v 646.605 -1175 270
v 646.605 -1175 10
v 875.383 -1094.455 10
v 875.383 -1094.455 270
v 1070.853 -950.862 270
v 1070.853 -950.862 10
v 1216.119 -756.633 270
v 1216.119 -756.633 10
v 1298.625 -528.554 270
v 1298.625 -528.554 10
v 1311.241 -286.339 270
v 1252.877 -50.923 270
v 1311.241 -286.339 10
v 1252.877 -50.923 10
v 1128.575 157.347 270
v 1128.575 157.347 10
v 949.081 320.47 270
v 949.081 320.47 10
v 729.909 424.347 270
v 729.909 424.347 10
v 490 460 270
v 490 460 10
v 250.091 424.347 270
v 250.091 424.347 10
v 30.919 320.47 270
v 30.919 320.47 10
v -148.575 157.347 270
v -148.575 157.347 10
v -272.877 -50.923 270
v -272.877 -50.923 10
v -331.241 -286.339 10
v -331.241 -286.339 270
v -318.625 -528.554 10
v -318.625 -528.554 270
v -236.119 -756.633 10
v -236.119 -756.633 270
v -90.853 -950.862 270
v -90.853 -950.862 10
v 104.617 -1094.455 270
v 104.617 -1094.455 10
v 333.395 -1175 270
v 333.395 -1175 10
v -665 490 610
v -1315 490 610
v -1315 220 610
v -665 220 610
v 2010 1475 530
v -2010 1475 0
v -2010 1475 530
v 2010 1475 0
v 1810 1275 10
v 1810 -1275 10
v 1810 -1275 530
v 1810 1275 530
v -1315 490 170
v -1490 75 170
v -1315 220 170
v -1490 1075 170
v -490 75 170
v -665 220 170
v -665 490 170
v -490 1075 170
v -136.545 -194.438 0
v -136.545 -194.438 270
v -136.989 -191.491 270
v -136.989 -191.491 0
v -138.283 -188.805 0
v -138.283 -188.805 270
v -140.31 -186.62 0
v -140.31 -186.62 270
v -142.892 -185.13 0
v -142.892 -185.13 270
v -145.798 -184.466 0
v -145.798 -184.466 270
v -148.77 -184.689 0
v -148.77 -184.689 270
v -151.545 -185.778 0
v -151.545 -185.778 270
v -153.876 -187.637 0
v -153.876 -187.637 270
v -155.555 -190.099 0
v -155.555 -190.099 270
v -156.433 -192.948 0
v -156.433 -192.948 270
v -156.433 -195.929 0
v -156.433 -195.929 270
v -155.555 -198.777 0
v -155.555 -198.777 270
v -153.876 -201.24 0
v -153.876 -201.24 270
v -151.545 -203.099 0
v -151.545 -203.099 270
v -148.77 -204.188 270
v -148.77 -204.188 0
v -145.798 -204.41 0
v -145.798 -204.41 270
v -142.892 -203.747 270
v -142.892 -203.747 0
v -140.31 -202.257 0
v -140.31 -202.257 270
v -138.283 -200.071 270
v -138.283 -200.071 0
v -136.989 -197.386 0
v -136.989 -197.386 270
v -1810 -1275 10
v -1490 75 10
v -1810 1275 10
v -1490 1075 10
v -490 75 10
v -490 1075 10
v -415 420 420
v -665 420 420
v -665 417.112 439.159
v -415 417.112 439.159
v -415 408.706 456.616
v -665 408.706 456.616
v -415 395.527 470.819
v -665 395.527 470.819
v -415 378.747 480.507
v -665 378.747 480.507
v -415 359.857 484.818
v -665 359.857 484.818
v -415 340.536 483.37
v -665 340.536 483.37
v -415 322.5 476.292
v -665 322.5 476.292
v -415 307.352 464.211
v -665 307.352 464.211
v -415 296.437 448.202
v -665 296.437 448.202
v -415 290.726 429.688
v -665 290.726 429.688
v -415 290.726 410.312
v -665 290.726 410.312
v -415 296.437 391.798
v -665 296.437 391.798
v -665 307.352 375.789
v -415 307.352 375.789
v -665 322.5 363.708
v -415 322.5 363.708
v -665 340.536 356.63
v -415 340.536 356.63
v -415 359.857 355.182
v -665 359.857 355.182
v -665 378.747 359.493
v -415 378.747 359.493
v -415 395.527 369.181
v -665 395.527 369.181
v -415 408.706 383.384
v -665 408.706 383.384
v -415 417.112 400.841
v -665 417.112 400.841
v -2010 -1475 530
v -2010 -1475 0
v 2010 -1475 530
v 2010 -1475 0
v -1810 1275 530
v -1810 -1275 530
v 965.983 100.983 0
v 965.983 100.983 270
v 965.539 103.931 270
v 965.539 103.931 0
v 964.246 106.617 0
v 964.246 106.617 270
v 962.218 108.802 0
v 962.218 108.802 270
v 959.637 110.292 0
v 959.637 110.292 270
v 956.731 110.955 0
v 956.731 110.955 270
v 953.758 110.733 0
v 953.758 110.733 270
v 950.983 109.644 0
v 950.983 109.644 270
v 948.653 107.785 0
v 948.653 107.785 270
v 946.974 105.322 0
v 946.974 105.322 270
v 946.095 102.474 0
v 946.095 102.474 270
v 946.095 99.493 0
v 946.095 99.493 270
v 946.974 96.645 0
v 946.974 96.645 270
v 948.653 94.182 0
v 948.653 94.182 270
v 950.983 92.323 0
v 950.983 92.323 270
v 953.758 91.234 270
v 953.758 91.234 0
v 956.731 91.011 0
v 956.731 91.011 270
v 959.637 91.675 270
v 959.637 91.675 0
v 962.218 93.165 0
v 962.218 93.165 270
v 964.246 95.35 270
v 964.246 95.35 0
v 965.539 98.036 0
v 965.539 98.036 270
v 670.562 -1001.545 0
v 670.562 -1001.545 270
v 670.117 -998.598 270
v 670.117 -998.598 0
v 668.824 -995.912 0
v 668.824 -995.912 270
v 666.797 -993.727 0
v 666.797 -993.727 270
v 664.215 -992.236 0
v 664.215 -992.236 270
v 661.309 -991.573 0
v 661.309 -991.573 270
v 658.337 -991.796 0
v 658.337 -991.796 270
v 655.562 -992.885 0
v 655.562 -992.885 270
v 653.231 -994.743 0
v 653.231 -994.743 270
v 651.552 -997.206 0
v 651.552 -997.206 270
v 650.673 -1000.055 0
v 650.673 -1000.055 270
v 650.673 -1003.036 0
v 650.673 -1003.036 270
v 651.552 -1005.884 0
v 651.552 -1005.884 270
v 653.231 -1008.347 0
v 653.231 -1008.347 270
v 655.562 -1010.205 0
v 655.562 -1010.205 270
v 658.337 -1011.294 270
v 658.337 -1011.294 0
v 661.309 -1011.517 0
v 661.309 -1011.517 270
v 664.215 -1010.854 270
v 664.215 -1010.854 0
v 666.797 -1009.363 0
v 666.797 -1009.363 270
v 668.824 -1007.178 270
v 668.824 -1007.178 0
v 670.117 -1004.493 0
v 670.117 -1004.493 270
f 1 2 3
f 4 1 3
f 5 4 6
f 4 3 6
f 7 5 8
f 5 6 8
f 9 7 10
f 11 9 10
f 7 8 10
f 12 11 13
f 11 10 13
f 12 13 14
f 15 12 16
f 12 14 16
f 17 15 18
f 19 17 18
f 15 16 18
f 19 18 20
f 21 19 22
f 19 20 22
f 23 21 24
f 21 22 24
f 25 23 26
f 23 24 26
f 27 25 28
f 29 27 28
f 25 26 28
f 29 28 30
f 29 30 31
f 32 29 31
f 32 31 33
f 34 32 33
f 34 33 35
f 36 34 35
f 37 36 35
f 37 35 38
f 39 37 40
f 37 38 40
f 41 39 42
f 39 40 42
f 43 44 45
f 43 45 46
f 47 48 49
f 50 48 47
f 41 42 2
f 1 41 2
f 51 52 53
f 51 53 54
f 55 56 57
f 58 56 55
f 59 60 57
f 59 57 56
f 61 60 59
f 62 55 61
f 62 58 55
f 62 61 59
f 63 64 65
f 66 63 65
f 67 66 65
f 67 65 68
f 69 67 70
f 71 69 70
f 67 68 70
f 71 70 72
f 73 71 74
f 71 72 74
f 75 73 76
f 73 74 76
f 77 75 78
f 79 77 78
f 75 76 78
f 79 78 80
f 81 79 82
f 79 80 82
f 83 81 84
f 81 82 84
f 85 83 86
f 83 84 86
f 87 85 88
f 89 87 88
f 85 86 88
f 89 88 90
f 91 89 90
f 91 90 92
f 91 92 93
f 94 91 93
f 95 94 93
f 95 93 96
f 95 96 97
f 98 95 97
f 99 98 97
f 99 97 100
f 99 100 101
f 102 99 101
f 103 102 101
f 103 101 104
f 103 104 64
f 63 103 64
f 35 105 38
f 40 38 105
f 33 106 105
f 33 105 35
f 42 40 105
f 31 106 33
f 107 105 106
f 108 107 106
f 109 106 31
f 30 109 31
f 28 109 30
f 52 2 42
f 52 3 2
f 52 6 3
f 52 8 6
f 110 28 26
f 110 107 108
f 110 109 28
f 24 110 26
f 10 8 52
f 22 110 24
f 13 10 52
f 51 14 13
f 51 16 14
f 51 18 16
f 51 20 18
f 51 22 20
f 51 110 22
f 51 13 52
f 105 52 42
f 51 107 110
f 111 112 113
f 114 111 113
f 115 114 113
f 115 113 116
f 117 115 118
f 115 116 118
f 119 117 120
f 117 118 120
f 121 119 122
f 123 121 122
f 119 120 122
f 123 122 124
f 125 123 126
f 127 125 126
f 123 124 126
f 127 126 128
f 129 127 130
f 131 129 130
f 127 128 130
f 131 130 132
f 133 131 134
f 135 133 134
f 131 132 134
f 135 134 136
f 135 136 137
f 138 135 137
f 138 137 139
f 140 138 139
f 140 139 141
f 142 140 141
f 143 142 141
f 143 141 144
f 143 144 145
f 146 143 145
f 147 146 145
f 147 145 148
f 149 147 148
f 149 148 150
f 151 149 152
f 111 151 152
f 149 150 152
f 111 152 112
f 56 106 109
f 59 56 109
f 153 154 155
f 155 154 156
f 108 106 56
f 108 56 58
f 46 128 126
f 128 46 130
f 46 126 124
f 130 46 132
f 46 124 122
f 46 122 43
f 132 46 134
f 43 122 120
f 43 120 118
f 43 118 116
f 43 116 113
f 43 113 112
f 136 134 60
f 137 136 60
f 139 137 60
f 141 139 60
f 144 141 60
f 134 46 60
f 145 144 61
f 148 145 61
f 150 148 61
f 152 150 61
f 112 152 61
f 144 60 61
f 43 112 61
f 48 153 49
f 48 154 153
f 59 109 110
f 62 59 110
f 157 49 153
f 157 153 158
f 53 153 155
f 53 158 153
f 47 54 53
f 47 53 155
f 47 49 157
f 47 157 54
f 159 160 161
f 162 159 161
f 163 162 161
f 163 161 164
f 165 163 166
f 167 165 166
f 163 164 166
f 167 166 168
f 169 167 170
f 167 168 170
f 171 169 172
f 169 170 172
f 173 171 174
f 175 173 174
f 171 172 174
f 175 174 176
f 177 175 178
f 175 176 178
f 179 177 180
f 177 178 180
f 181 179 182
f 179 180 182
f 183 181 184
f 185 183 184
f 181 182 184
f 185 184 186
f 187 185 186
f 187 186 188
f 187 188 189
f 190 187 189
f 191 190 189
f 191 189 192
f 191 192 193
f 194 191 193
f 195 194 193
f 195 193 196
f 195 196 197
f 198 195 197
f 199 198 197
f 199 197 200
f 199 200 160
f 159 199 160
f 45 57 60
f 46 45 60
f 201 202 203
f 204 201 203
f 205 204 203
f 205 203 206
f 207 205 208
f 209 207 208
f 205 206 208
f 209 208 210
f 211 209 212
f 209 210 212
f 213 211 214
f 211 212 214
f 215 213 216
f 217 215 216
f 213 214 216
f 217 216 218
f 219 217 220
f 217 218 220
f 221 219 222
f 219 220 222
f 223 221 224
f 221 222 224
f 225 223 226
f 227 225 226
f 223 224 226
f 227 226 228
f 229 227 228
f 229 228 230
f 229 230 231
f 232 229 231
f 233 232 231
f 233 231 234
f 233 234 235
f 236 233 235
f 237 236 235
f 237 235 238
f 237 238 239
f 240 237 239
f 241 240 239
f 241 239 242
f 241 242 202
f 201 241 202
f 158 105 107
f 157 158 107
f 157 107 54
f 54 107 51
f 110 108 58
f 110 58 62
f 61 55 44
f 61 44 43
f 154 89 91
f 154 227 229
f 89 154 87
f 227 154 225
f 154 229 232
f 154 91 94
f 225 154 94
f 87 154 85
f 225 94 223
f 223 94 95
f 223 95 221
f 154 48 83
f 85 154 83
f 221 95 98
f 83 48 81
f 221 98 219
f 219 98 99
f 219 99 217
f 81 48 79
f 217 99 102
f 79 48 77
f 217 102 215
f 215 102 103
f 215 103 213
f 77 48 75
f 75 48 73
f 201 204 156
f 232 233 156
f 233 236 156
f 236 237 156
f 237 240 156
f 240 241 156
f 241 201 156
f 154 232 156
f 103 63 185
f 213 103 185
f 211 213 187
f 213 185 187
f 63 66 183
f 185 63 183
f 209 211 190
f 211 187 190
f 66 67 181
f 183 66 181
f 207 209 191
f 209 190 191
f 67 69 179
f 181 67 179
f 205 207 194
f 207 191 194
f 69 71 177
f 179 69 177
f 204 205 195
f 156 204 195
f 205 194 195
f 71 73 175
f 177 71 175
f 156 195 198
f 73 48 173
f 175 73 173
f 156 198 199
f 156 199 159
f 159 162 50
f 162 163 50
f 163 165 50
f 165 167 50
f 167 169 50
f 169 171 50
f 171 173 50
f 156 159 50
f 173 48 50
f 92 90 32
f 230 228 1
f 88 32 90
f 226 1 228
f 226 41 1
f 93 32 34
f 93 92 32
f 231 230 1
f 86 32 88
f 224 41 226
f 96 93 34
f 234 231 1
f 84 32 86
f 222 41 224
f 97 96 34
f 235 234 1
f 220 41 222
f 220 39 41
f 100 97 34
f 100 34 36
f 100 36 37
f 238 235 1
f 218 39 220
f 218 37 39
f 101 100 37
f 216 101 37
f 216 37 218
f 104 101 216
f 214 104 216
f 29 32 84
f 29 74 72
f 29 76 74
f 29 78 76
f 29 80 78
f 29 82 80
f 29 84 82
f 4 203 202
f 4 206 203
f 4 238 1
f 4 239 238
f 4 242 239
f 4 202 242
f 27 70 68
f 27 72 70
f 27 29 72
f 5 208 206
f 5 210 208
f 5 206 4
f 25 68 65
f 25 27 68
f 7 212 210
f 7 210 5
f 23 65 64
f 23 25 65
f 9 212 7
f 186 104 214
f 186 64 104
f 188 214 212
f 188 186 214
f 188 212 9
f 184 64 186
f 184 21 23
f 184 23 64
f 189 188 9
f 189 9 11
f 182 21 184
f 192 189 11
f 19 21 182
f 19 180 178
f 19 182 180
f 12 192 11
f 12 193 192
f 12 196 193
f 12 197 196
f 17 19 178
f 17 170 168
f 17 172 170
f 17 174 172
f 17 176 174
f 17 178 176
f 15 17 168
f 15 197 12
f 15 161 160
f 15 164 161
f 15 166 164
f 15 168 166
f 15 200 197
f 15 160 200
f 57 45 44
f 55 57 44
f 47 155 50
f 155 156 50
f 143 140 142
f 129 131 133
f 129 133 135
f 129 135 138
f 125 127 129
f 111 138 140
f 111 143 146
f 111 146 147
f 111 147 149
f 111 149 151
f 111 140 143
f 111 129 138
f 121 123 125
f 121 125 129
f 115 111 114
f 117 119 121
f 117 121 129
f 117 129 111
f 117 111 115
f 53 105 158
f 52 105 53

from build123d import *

# Parameters (mm, degrees)
F0_W      = 4020
F0_H      = 2950
F1_DEPTH  = 10
F2_W      = 4020
F2_H      = 2950
F2_W_2    = 3620
F2_H_2    = 2550
F3_DEPTH  = 520
F4_W      = 1000
F4_H      = 1000
F5_DEPTH  = 160
F7_DEPTH  = 260
F8_W      = 650
F8_H      = 270
F9_DEPTH  = 440
F10_R     = 65
F11_DEPTH = 250
F12_R     = 10
F13_DEPTH = 280


with BuildPart() as f1:
    # F0 (on Top) → F1 (new body)
    with BuildSketch(Plane.XY):
        Rectangle(F0_W, F0_H)
    extrude(amount=F1_DEPTH)

    # F2 (on face) → F3 (join)
    with BuildSketch(Plane.XY.offset(10)):
        Rectangle(F2_W, F2_H)
        Rectangle(F2_W_2, F2_H_2, mode=Mode.SUBTRACT)
    extrude(amount=F3_DEPTH)

    # F4 (on face) → F5 (join)
    with BuildSketch(Plane.XY.offset(10)):
        with Locations((-990, 575)):
            Rectangle(F4_W, F4_H)
    extrude(amount=F5_DEPTH)

    # F6 (on face) → F7 (join)
    with BuildSketch(Plane.XY.offset(10)):
        with BuildLine():
            Line((333.395402, -1175), (646.604598, -1175))
            ThreePointArc((646.604598, -1175), (490, 460), (333.395402, -1175))
        make_face()
    extrude(amount=F7_DEPTH)

    # F8 (on face) → F9 (join)
    with BuildSketch(Plane.XY.offset(170)):
        with Locations((-990, 355)):
            Rectangle(F8_W, F8_H)
    extrude(amount=F9_DEPTH)

    # F10 (on face) → F11 (join)
    with BuildSketch(Plane.YZ.offset(-665)):
        with Locations((355, 420)):
            Circle(F10_R)
    extrude(amount=F11_DEPTH)

    # F12 (on face) → F13 (cut)
    with BuildSketch(Plane.XY.offset(270)):
        with Locations((955.983369, 100.983369)):
            Circle(F12_R)
        with Locations((660.561751, -1001.54512)):
            Circle(F12_R)
        with Locations((-146.54512, -194.438249)):
            Circle(F12_R)
    extrude(amount=-F13_DEPTH, mode=Mode.SUBTRACT)


solid = f1.part
